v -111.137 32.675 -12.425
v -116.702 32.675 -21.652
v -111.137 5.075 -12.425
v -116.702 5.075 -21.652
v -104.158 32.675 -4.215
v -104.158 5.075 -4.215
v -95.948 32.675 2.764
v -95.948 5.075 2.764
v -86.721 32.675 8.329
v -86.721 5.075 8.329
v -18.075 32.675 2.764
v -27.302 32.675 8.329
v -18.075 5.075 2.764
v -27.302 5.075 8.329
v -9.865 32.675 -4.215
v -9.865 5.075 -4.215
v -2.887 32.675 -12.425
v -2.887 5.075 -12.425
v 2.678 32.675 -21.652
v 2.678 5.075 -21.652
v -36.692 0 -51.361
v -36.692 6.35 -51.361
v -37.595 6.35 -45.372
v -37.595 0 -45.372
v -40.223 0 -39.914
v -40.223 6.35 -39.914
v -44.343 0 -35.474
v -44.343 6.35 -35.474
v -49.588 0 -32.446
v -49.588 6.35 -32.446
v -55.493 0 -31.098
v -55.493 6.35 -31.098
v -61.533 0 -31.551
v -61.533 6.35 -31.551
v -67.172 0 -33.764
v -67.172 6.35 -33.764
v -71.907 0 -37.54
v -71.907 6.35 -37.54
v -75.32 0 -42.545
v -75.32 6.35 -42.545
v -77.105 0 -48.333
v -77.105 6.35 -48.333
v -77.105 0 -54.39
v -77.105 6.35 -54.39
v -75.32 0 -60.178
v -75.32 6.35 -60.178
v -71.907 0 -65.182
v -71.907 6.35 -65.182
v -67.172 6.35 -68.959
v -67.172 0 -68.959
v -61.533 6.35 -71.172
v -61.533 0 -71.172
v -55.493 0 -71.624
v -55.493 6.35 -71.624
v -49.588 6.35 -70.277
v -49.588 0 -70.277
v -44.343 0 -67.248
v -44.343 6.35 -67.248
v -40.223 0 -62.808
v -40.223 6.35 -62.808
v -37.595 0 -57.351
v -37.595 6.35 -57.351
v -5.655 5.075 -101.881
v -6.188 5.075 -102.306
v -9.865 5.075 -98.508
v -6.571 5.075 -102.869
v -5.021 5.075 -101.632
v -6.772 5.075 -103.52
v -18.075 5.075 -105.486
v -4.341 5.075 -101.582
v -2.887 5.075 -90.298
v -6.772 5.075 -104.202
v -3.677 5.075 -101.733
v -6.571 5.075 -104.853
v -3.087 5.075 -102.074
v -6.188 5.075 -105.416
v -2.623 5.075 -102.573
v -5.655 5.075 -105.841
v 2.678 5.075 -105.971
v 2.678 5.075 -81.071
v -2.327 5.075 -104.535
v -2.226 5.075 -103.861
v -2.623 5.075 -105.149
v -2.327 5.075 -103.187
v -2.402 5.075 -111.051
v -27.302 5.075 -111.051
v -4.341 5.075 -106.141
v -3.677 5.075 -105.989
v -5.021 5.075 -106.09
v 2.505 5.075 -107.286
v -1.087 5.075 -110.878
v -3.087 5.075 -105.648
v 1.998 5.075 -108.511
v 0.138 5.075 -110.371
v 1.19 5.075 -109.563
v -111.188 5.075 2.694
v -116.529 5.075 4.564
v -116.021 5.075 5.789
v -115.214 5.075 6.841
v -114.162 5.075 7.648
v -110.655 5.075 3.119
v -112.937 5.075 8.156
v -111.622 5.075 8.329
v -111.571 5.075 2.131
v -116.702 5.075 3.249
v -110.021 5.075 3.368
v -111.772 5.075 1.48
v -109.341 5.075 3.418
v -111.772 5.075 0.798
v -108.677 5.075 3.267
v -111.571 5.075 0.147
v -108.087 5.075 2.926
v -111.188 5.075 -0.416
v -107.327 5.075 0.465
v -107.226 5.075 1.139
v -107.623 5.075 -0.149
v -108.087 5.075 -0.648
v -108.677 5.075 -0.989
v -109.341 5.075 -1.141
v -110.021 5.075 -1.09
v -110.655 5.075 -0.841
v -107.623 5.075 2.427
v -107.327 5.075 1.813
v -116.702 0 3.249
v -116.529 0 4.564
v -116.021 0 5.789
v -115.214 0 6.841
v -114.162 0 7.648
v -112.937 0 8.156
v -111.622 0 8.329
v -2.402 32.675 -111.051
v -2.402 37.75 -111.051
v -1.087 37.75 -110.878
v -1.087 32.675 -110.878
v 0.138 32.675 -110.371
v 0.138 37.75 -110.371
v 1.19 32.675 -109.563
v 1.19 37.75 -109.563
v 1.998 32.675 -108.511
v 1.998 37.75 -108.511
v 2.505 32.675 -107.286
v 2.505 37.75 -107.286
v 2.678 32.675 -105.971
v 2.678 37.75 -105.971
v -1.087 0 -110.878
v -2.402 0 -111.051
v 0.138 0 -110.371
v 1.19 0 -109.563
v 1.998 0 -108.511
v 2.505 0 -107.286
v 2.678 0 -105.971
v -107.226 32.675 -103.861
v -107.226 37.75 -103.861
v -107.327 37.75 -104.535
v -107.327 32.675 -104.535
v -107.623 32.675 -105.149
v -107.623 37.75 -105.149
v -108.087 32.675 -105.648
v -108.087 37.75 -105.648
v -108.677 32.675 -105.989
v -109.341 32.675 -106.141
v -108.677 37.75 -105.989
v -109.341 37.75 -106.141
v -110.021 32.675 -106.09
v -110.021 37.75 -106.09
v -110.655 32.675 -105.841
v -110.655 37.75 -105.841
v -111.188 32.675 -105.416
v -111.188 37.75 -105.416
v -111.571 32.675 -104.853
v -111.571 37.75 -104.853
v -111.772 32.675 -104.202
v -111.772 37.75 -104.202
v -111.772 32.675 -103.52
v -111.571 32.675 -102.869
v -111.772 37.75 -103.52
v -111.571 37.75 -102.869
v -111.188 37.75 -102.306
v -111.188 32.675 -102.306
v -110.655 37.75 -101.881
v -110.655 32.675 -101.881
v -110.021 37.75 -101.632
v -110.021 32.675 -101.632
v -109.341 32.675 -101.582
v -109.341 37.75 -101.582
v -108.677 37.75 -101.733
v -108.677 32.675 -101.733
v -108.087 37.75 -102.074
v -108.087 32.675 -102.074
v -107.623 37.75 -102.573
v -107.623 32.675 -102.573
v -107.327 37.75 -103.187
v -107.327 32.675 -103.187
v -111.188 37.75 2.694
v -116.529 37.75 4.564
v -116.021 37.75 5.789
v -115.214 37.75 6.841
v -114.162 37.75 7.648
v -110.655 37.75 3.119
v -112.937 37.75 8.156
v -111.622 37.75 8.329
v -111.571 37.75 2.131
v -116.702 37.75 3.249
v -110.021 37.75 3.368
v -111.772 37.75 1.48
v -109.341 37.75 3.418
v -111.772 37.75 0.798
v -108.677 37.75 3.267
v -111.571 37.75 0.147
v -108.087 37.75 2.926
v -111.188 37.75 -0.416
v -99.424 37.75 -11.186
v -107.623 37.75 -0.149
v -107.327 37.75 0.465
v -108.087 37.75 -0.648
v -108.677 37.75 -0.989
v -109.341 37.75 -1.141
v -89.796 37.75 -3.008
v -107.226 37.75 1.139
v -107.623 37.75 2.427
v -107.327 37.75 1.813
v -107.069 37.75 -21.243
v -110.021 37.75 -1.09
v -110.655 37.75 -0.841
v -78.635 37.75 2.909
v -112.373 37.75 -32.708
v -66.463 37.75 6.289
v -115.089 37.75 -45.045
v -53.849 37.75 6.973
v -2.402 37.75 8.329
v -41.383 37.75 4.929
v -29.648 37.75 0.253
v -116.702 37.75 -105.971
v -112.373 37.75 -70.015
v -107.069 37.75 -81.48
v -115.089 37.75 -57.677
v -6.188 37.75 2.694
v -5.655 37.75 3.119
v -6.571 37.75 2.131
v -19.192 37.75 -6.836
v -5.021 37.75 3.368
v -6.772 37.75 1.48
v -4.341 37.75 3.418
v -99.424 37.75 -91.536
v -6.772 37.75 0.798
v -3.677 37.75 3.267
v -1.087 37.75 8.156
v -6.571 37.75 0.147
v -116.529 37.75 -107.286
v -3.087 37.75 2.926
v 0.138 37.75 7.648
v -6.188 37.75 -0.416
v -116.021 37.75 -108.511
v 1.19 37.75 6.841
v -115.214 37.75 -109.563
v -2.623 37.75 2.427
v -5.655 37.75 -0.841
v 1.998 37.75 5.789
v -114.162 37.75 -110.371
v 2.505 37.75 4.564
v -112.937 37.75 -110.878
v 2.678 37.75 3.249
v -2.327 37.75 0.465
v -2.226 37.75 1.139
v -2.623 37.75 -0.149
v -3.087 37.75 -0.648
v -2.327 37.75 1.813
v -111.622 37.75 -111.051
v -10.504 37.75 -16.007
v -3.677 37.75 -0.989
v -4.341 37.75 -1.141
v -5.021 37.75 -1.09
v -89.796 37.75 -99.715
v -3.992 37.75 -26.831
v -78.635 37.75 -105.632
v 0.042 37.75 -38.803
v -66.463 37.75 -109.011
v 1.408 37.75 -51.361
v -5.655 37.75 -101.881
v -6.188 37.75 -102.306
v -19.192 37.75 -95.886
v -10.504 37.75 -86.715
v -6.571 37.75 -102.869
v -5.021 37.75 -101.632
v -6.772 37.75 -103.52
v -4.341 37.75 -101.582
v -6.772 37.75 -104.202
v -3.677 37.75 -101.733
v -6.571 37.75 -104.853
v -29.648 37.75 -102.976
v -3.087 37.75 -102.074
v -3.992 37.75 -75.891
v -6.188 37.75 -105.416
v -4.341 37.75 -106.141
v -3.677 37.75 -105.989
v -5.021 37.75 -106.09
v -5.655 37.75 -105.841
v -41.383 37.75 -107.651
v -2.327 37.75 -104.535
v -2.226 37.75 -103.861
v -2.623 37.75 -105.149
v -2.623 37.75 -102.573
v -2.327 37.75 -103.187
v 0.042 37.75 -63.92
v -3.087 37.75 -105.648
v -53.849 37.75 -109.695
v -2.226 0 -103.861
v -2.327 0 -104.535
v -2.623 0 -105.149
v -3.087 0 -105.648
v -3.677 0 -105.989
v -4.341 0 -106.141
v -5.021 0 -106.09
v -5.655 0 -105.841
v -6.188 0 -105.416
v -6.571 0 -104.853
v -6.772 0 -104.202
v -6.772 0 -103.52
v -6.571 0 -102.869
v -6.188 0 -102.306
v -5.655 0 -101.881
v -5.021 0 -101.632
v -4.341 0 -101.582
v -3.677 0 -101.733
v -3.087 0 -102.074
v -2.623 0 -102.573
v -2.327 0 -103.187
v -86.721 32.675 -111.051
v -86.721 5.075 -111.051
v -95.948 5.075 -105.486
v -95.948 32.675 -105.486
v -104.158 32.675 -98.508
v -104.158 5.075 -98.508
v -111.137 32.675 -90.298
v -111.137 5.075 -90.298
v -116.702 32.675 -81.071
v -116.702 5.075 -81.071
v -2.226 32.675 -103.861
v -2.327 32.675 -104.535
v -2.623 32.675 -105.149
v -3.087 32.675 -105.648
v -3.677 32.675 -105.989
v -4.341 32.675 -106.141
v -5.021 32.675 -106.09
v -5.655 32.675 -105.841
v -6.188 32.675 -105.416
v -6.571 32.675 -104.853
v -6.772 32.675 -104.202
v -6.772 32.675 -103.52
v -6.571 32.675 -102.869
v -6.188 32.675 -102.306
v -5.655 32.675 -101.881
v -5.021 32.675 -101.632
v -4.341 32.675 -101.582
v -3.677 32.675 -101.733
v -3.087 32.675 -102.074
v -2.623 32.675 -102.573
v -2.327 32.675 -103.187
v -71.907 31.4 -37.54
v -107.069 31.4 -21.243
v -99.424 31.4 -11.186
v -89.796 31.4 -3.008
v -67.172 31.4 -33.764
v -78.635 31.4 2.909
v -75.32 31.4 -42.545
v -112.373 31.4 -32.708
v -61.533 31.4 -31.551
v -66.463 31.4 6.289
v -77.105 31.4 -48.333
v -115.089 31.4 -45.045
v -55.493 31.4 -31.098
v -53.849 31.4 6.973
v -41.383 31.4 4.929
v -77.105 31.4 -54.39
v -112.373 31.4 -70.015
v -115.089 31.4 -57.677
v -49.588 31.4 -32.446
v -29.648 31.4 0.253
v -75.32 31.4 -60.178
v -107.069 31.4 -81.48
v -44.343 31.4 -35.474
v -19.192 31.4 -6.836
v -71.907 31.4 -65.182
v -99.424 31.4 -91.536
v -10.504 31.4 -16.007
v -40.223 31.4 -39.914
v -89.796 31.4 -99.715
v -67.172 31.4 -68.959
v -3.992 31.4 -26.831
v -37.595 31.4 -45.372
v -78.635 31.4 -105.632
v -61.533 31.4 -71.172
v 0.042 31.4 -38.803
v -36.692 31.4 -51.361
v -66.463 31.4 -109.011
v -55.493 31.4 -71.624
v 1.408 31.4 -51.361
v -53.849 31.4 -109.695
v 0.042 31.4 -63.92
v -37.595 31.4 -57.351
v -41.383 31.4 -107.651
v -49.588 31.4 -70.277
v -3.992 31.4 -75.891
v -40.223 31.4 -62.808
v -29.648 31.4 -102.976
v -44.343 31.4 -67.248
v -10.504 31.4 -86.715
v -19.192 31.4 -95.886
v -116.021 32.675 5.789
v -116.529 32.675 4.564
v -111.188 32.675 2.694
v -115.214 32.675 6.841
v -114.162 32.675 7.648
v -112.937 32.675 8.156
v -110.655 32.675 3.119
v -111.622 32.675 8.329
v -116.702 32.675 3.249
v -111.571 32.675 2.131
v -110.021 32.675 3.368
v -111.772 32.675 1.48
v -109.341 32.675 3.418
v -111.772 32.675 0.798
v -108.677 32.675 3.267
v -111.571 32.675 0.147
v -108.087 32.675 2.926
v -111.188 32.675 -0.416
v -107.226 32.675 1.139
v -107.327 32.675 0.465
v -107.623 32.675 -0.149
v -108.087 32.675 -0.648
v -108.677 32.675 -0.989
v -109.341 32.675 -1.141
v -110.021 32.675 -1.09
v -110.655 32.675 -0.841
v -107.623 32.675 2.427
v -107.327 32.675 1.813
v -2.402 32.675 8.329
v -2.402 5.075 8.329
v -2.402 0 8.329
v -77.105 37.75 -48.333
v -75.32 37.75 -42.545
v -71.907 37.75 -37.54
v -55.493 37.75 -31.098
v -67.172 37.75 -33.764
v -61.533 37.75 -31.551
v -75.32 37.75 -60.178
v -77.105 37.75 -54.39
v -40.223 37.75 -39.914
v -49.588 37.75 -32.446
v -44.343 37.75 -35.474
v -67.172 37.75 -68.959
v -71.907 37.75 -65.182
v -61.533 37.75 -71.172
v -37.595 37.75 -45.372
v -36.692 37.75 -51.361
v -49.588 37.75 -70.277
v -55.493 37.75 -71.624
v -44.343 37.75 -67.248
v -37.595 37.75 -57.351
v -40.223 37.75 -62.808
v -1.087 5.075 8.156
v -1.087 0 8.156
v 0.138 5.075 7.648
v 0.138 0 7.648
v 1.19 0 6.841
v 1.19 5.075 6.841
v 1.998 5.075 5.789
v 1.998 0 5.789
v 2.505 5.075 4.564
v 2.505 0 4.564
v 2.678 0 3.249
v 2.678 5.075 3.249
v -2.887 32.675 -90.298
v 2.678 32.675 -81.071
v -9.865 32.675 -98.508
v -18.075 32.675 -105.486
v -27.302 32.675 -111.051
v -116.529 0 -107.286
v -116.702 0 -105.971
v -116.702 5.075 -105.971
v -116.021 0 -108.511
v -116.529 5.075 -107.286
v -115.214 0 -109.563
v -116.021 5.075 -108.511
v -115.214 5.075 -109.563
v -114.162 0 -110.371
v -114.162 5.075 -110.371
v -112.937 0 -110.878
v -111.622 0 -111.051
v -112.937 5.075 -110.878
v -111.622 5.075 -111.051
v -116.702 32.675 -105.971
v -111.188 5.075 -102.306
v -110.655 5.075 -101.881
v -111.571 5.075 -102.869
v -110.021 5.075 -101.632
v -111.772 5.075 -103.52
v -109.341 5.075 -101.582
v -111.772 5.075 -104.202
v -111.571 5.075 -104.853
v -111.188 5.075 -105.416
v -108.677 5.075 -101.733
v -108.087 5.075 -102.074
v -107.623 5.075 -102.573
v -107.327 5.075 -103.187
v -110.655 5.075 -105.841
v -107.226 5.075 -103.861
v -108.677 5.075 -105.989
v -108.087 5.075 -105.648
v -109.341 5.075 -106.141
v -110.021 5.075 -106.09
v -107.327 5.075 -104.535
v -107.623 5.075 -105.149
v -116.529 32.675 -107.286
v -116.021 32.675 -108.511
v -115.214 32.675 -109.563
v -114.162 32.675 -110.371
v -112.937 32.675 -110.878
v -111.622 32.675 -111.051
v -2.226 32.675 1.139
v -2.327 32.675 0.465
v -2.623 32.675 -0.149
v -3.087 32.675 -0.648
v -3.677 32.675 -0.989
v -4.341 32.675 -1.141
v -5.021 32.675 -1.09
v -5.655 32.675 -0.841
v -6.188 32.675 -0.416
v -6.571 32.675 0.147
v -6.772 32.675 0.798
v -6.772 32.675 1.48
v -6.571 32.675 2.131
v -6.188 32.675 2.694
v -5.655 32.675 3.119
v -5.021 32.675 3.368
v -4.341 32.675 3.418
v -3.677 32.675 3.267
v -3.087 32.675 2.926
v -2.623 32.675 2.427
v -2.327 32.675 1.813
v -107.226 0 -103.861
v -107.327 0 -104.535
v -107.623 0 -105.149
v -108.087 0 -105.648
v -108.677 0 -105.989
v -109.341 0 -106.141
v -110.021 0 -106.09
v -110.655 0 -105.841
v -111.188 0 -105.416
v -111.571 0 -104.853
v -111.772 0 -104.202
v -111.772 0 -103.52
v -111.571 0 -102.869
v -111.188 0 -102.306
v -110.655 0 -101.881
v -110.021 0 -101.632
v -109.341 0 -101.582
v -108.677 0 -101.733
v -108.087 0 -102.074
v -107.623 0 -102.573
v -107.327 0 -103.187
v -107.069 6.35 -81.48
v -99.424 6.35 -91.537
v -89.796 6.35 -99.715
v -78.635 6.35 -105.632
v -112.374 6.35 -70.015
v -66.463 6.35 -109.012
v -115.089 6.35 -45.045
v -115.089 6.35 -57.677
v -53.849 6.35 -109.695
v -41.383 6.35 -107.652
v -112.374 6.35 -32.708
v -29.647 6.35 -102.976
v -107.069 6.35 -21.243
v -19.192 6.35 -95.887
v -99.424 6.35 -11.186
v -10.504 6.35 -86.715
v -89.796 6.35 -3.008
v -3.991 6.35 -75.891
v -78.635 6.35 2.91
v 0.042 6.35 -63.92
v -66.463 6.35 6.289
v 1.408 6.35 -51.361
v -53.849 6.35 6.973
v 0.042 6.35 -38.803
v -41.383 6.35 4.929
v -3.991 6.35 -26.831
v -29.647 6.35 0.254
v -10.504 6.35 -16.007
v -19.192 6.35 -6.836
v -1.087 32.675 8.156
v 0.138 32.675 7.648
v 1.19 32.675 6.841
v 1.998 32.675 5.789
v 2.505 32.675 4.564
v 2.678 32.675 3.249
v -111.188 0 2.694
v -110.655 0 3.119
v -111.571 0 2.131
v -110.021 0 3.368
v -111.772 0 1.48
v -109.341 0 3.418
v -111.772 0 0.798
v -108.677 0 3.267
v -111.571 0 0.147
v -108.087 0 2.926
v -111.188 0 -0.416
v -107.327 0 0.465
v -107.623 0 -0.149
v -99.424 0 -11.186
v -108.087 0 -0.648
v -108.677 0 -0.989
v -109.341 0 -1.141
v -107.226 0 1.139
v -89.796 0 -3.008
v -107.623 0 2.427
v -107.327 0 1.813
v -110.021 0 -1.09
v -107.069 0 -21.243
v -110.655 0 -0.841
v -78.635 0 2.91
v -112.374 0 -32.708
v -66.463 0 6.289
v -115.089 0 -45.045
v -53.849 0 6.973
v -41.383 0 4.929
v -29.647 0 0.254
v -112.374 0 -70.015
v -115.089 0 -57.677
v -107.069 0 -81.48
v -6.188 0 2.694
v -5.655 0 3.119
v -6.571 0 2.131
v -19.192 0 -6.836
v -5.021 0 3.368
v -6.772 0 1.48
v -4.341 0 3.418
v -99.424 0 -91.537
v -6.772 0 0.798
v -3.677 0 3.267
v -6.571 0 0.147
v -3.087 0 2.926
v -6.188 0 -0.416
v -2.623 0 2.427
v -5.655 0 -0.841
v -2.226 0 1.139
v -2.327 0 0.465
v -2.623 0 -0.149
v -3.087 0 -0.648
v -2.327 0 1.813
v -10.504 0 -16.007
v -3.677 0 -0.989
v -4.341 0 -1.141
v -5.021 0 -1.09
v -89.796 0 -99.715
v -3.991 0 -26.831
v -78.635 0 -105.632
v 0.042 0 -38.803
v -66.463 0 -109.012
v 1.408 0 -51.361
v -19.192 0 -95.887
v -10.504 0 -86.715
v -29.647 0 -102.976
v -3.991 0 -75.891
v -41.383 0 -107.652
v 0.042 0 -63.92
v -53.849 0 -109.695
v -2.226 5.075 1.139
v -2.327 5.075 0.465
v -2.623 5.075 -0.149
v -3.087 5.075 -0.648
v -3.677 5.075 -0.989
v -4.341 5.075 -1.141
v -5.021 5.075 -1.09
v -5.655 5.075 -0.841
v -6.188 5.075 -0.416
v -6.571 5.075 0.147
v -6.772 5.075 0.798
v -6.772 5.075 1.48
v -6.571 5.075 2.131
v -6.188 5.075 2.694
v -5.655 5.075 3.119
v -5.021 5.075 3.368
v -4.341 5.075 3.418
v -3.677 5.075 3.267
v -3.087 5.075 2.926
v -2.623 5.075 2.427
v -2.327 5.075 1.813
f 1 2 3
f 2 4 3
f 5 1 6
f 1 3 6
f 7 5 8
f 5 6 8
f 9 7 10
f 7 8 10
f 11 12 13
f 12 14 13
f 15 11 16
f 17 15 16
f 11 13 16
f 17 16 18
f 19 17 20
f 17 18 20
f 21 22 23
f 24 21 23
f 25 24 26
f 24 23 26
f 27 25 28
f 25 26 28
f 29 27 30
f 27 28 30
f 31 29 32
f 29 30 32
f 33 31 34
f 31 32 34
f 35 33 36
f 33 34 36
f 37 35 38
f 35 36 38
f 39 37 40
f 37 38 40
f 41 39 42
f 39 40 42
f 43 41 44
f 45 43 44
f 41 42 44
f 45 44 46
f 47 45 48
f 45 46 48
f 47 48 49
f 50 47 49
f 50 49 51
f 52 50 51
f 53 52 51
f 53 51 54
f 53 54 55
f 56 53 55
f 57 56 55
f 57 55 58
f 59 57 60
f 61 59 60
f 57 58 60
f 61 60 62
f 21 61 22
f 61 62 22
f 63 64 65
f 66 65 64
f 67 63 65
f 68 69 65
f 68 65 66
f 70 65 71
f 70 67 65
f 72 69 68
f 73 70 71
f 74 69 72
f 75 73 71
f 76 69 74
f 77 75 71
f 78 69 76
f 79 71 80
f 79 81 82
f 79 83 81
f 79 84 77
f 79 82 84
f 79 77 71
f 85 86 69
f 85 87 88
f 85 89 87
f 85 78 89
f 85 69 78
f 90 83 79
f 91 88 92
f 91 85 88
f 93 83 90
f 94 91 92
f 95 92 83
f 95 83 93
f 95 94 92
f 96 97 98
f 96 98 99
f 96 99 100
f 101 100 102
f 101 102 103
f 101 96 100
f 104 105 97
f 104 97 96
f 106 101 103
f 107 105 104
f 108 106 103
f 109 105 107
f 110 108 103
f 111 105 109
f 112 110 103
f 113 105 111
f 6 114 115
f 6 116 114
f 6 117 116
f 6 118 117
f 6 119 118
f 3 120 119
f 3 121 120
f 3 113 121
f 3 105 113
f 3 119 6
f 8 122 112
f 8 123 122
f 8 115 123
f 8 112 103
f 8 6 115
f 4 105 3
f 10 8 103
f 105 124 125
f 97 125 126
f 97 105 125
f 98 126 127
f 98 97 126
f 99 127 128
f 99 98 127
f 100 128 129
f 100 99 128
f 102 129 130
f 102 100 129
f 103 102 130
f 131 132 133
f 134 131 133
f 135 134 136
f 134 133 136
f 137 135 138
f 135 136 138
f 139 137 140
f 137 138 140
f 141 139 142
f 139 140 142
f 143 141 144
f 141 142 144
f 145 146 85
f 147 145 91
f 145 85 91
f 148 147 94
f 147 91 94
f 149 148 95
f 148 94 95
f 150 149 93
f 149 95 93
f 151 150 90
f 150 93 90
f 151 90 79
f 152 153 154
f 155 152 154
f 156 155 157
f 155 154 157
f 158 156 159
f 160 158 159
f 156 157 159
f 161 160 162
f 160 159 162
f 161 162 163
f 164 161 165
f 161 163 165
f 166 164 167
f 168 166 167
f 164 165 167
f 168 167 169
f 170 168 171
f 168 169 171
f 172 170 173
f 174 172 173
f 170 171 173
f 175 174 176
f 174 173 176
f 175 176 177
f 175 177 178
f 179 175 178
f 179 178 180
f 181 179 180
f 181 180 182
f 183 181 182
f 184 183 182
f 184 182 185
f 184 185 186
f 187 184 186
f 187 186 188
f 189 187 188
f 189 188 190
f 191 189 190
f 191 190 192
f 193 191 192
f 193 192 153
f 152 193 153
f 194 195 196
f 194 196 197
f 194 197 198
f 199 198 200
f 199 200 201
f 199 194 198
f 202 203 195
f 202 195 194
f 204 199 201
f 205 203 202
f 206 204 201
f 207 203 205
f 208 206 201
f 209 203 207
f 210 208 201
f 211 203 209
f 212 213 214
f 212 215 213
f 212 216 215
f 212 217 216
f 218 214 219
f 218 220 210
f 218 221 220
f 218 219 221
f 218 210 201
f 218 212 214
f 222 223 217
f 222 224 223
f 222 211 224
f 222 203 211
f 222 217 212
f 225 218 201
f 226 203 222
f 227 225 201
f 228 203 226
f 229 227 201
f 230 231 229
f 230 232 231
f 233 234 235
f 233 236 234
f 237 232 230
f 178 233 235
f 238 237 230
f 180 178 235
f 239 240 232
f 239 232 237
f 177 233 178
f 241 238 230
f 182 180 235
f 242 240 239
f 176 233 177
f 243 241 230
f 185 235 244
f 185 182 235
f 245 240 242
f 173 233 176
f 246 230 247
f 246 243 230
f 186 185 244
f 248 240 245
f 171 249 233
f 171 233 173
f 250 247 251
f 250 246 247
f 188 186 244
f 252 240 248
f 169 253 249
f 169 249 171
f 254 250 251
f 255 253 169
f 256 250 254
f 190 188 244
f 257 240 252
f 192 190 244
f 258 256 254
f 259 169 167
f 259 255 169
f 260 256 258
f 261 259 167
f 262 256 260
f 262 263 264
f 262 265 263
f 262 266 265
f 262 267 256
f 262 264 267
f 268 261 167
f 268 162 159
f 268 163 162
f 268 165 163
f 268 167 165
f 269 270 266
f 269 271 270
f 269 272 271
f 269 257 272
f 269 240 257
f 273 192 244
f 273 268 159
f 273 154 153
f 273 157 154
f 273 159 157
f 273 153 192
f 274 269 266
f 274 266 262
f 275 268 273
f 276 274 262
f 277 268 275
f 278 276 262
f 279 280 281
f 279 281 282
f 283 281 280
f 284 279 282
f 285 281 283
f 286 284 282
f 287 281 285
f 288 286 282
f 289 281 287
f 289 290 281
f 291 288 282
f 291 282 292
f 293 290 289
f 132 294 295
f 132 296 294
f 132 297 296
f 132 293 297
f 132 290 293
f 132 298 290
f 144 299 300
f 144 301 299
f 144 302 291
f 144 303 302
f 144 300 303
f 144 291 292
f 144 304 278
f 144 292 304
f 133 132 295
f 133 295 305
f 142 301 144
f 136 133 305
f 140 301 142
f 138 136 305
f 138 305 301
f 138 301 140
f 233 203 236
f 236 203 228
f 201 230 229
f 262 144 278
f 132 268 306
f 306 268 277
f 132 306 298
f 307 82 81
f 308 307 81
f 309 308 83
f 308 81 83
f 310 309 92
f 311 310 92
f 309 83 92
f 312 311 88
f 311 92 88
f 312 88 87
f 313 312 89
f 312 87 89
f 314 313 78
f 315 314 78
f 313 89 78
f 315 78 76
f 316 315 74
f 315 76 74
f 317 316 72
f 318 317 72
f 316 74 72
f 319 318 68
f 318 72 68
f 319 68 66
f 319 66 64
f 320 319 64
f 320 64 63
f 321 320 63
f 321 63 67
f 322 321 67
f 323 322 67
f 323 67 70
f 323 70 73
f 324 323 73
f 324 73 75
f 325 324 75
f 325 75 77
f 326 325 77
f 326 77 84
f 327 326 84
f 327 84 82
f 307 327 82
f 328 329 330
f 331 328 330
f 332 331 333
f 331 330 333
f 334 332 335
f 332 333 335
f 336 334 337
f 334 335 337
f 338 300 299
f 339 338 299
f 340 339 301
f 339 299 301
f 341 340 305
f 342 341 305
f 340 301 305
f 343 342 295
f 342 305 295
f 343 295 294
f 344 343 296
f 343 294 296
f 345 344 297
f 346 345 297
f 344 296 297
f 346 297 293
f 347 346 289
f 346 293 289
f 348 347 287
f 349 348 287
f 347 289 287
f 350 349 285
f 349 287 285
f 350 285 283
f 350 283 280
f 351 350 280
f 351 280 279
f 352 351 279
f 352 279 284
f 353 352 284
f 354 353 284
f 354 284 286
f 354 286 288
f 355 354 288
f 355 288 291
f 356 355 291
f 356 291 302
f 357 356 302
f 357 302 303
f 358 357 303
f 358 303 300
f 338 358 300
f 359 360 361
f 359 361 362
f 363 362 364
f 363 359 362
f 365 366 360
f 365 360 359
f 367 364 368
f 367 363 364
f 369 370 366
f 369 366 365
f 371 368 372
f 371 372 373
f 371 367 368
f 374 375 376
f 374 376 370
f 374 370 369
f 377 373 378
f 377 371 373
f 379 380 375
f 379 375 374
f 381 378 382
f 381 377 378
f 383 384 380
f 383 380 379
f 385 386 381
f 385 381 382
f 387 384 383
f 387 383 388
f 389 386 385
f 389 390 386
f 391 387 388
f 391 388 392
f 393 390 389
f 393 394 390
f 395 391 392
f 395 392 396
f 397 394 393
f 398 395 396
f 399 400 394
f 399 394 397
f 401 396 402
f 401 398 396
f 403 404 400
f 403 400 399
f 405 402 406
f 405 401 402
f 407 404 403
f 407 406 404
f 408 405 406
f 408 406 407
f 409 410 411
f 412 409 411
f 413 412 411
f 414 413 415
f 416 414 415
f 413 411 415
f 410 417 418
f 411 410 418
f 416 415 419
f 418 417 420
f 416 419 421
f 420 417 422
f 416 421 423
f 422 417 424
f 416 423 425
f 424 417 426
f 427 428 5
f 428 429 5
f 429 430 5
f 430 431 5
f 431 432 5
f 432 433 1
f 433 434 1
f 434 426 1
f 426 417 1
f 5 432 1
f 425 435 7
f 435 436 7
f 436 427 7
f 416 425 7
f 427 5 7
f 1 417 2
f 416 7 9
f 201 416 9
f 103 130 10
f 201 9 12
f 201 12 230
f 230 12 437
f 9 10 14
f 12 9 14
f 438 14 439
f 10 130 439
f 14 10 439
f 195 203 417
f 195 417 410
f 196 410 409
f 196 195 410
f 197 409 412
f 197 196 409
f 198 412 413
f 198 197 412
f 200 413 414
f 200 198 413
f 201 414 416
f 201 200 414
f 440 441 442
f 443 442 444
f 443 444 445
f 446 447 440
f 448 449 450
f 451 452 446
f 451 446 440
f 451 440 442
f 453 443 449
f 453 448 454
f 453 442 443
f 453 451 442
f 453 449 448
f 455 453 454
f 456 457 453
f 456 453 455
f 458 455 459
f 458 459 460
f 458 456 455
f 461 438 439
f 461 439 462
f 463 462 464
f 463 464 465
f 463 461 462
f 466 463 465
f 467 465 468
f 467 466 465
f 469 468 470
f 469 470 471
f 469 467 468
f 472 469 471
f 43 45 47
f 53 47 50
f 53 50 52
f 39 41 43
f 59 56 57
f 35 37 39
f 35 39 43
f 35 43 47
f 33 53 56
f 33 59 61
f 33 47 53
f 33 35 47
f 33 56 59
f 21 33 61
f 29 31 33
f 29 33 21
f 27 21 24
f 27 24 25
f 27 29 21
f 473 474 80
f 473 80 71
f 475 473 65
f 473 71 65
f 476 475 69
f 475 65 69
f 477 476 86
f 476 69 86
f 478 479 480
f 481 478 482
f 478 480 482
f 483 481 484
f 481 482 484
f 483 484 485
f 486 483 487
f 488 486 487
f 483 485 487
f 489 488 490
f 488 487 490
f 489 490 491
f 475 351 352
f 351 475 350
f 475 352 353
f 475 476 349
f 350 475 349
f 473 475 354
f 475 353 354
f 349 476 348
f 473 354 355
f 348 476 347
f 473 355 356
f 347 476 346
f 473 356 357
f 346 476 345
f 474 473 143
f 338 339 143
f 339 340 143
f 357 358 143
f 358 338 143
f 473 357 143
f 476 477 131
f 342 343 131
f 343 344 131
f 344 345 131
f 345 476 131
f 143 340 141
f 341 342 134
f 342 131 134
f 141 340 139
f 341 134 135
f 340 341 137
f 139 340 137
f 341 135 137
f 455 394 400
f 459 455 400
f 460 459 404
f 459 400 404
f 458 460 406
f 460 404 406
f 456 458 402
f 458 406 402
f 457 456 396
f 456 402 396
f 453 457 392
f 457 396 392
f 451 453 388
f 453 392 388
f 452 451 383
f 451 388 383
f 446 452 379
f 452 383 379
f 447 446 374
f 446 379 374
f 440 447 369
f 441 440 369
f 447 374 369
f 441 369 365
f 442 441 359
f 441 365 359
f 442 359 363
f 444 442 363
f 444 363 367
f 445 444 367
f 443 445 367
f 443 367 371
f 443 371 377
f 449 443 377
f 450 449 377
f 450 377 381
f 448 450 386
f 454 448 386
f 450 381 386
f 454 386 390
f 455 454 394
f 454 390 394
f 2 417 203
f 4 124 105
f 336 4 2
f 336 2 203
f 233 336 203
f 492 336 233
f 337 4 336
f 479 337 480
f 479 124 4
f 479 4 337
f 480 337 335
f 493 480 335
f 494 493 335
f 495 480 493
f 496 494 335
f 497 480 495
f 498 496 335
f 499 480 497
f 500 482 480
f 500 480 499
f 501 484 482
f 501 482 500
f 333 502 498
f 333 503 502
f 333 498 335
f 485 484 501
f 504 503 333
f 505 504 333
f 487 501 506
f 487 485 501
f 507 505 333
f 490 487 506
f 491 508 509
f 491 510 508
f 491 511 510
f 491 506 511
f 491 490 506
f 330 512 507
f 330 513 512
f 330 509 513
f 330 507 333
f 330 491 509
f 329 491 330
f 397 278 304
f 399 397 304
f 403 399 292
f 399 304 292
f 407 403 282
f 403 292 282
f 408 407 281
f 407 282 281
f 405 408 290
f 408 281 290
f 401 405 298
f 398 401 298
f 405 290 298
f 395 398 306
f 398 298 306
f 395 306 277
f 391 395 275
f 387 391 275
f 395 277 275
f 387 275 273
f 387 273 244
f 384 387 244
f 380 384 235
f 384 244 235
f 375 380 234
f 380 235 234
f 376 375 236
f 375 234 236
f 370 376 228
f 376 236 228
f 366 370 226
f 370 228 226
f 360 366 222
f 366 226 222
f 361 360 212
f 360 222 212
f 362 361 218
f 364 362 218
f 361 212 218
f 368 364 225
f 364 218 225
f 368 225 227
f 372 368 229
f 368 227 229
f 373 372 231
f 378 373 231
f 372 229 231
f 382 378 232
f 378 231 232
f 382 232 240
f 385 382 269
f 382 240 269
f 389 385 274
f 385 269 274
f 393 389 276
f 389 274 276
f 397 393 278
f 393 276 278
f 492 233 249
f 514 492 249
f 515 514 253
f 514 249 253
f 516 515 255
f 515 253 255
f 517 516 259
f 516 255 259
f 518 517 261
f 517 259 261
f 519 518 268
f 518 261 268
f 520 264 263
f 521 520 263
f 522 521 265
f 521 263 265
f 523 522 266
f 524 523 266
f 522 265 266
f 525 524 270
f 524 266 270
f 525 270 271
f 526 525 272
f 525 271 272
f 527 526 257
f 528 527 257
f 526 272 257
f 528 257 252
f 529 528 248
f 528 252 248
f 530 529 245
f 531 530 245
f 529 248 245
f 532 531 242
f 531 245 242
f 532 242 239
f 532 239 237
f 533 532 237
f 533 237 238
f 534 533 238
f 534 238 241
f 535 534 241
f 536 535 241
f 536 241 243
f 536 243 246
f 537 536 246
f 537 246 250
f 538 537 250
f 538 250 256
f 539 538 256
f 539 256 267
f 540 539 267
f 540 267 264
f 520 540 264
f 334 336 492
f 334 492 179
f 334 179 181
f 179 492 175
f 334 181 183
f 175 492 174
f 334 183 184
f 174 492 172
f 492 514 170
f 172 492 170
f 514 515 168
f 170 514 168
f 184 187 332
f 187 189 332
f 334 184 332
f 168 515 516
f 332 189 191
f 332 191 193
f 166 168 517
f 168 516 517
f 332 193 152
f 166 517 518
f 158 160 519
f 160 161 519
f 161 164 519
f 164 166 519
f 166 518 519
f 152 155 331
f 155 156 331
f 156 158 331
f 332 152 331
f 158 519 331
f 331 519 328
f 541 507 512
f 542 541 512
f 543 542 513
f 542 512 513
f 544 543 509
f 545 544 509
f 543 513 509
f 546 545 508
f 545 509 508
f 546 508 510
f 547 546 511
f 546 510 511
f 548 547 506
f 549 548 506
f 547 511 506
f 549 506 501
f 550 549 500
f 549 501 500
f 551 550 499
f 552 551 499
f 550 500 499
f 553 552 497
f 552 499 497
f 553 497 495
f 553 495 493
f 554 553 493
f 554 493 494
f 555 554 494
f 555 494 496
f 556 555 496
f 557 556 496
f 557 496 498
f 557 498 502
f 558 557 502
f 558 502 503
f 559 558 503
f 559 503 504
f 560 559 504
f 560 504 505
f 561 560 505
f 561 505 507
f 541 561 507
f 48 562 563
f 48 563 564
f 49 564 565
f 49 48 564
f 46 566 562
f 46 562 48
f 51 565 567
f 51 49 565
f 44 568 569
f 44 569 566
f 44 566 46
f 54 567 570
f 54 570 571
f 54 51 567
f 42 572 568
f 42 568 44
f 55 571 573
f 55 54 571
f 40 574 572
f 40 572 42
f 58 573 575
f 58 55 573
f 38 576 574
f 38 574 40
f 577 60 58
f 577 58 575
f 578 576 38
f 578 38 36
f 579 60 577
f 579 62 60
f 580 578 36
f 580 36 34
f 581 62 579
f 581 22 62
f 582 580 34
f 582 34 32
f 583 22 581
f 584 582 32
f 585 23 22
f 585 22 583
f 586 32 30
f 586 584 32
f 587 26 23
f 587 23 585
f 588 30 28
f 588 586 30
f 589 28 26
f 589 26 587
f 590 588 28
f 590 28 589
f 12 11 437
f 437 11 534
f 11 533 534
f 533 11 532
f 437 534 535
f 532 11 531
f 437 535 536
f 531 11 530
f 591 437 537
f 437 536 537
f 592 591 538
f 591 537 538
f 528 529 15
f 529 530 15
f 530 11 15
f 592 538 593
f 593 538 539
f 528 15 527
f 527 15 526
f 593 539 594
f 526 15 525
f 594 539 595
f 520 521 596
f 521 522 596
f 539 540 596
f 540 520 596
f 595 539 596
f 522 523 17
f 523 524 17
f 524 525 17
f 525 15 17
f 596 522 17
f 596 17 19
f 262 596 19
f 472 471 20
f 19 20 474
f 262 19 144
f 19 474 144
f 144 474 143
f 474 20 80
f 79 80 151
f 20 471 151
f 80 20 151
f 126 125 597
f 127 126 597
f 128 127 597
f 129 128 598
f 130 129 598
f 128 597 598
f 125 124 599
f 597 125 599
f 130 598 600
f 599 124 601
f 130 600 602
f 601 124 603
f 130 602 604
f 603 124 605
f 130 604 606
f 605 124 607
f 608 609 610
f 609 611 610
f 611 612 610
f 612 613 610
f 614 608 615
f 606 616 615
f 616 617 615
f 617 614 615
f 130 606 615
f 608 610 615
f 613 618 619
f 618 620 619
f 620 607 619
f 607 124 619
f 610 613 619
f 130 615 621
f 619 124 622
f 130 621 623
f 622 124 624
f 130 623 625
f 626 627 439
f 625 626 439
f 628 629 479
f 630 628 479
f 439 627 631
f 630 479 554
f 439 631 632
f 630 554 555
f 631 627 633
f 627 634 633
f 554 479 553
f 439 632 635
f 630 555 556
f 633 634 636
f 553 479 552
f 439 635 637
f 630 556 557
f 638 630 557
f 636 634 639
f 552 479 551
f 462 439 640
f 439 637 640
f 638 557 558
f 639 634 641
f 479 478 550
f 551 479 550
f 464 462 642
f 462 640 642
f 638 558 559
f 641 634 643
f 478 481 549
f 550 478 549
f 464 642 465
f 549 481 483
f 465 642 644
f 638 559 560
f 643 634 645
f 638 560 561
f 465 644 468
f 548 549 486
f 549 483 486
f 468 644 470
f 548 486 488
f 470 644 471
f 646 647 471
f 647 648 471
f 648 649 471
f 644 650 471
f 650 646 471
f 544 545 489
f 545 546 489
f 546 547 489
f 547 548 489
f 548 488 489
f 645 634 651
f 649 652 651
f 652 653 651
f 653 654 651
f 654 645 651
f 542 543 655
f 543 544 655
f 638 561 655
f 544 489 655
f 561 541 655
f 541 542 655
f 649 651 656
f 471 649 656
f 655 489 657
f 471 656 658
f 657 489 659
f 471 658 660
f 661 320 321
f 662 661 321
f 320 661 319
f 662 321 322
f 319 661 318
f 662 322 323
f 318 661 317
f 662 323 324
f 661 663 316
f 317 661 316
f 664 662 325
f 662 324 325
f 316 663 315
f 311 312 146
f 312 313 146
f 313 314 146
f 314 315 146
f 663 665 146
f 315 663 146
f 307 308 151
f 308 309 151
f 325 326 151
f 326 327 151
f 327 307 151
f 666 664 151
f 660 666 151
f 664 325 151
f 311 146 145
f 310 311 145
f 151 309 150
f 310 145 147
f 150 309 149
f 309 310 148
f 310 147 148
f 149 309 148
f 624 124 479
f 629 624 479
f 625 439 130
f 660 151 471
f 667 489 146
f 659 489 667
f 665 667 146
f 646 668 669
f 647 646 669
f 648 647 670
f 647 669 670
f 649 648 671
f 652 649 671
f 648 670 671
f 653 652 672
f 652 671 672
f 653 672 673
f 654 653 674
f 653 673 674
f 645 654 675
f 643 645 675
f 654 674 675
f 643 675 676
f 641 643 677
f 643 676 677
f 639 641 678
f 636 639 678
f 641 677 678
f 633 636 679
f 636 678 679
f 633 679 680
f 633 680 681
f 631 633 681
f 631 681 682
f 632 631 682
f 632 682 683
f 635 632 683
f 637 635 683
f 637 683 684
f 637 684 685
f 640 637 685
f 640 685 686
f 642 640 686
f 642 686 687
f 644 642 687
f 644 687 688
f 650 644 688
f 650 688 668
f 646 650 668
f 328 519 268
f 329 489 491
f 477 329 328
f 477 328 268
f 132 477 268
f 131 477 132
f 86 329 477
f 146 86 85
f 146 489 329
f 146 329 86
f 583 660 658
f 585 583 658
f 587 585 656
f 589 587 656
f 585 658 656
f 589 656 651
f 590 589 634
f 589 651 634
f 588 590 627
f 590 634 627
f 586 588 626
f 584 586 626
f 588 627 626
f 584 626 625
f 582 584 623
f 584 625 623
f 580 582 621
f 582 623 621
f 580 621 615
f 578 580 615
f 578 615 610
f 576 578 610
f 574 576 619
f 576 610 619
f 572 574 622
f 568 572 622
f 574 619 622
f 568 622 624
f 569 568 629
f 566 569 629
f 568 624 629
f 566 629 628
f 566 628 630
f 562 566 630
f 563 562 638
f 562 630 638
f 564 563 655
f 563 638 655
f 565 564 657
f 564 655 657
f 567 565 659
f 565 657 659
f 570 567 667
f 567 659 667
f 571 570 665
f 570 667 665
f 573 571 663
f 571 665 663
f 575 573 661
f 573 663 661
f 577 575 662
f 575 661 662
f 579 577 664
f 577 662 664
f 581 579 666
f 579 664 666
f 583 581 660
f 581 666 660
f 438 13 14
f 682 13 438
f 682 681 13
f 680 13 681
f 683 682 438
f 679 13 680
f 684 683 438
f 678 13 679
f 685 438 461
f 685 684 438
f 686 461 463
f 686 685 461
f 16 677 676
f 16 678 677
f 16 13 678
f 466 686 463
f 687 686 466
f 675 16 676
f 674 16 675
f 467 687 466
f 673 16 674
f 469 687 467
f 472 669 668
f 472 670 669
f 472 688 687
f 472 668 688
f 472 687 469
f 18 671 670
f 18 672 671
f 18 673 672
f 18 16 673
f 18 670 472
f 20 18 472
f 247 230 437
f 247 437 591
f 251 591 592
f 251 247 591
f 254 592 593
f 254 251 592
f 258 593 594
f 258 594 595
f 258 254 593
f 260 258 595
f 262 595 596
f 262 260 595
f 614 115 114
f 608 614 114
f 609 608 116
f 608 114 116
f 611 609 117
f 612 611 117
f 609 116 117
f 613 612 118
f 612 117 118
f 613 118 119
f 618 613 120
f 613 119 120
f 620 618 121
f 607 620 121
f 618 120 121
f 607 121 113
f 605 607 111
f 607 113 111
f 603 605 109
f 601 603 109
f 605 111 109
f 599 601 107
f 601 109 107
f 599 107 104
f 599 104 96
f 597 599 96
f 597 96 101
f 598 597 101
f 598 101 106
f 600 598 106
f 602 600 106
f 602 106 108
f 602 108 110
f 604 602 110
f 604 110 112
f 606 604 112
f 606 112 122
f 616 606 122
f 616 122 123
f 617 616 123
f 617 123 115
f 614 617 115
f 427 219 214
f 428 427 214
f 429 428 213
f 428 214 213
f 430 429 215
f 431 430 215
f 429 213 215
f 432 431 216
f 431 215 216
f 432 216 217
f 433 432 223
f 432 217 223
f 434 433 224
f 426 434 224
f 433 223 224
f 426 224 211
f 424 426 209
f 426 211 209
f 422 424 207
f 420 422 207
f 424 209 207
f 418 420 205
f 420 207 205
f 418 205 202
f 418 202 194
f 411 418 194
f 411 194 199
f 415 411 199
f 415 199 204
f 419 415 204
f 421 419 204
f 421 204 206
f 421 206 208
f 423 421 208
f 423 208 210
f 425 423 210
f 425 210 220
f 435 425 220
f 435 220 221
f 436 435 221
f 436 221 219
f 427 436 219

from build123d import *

# Parameters (mm, degrees)
SKETCH1_W           = 119.38
SKETCH1_H           = 119.38
BOSS_EXTRUDE1_DEPTH = 37.75
SKETCH2_R           = 2.286
CUT_EXTRUDE1_DEPTH  = 38.75
SKETCH3_R           = 58.41973455
CUT_EXTRUDE2_DEPTH  = 6.35
SKETCH4_R           = 58.42
CUT_EXTRUDE3_DEPTH  = 6.35
SKETCH5_R           = 20.32
BOSS_EXTRUDE2_DEPTH = 6.35
SKETCH6_R           = 20.32
BOSS_EXTRUDE3_DEPTH = 6.35
FILLET1_R           = 5.08
SKETCH7_R           = 88.9
SKETCH7_R_2         = 66.675
CUT_EXTRUDE5_DEPTH  = 13.8


with BuildPart() as part:
    # Sketch1 → Boss-Extrude1 (new body)
    with BuildSketch(Plane(origin=(0, 0, 0), x_dir=(1, 0, 0), z_dir=(0, 1, 0))):
        with Locations((-57.011822664, 51.361162791)):
            Rectangle(SKETCH1_W, SKETCH1_H)
    extrude(amount=BOSS_EXTRUDE1_DEPTH)

    # Sketch2 → Cut-Extrude1 (cut, through all)
    with BuildSketch(Plane(origin=(0, 37.75, 0), x_dir=(1, 0, 0), z_dir=(0, 1, 0))):
        with Locations((-109.511822664, 103.861162791)):
            Circle(SKETCH2_R)
        with Locations((-4.511822664, 103.861162791)):
            Circle(SKETCH2_R)
        with Locations((-4.511822664, -1.138837209)):
            Circle(SKETCH2_R)
        with Locations((-109.511822664, -1.138837209)):
            Circle(SKETCH2_R)
    extrude(amount=-CUT_EXTRUDE1_DEPTH, mode=Mode.SUBTRACT)

    # Sketch3 → Cut-Extrude2 (cut)
    with BuildSketch(Plane(origin=(0, 37.75, 0), x_dir=(1, 0, 0), z_dir=(0, 1, 0))):
        with Locations((-57.011822664, 51.361162791)):
            Circle(SKETCH3_R)
    extrude(amount=-CUT_EXTRUDE2_DEPTH, mode=Mode.SUBTRACT)

    # Sketch4 → Cut-Extrude3 (cut)
    with BuildSketch(Plane.XZ):
        with Locations((-57.011822664, -51.361162791)):
            Circle(SKETCH4_R)
    extrude(amount=-CUT_EXTRUDE3_DEPTH, mode=Mode.SUBTRACT)

    # Sketch5 → Boss-Extrude2 (add)
    with BuildSketch(Plane.XZ.offset(-6.35)):
        with Locations((-57.011822664, -51.361162791)):
            Circle(SKETCH5_R)
    extrude(amount=BOSS_EXTRUDE2_DEPTH)

    # Sketch6 → Boss-Extrude3 (add)
    with BuildSketch(Plane(origin=(0, 31.4, 0), x_dir=(1, 0, 0), z_dir=(0, 1, 0))):
        with Locations((-57.011822664, 51.361162791)):
            Circle(SKETCH6_R)
    extrude(amount=BOSS_EXTRUDE3_DEPTH)

    # Fillet1
    fillet1_edges = [part.edges().sort_by_distance(p)[0] for p in [
        (2.678177336, 18.875, 8.328837209),
        (-116.701822664, 18.875, 8.328837209),
        (-116.701822664, 18.875, -111.051162791),
        (2.678177336, 18.875, -111.051162791),
    ]]
    fillet(fillet1_edges, radius=FILLET1_R)

    # Sketch7 → Cut-Extrude5 (cut, symmetric)
    with BuildSketch(Plane(origin=(0, 18.875, 0), x_dir=(1, 0, 0), z_dir=(0, 1, 0))):
        with Locations((-57.011822664, 51.361162791)):
            Circle(SKETCH7_R)
        with Locations((-57.011822664, 51.361162791)):
            Circle(SKETCH7_R_2, mode=Mode.SUBTRACT)
    extrude(amount=CUT_EXTRUDE5_DEPTH, both=True, mode=Mode.SUBTRACT)


solid = part.part
